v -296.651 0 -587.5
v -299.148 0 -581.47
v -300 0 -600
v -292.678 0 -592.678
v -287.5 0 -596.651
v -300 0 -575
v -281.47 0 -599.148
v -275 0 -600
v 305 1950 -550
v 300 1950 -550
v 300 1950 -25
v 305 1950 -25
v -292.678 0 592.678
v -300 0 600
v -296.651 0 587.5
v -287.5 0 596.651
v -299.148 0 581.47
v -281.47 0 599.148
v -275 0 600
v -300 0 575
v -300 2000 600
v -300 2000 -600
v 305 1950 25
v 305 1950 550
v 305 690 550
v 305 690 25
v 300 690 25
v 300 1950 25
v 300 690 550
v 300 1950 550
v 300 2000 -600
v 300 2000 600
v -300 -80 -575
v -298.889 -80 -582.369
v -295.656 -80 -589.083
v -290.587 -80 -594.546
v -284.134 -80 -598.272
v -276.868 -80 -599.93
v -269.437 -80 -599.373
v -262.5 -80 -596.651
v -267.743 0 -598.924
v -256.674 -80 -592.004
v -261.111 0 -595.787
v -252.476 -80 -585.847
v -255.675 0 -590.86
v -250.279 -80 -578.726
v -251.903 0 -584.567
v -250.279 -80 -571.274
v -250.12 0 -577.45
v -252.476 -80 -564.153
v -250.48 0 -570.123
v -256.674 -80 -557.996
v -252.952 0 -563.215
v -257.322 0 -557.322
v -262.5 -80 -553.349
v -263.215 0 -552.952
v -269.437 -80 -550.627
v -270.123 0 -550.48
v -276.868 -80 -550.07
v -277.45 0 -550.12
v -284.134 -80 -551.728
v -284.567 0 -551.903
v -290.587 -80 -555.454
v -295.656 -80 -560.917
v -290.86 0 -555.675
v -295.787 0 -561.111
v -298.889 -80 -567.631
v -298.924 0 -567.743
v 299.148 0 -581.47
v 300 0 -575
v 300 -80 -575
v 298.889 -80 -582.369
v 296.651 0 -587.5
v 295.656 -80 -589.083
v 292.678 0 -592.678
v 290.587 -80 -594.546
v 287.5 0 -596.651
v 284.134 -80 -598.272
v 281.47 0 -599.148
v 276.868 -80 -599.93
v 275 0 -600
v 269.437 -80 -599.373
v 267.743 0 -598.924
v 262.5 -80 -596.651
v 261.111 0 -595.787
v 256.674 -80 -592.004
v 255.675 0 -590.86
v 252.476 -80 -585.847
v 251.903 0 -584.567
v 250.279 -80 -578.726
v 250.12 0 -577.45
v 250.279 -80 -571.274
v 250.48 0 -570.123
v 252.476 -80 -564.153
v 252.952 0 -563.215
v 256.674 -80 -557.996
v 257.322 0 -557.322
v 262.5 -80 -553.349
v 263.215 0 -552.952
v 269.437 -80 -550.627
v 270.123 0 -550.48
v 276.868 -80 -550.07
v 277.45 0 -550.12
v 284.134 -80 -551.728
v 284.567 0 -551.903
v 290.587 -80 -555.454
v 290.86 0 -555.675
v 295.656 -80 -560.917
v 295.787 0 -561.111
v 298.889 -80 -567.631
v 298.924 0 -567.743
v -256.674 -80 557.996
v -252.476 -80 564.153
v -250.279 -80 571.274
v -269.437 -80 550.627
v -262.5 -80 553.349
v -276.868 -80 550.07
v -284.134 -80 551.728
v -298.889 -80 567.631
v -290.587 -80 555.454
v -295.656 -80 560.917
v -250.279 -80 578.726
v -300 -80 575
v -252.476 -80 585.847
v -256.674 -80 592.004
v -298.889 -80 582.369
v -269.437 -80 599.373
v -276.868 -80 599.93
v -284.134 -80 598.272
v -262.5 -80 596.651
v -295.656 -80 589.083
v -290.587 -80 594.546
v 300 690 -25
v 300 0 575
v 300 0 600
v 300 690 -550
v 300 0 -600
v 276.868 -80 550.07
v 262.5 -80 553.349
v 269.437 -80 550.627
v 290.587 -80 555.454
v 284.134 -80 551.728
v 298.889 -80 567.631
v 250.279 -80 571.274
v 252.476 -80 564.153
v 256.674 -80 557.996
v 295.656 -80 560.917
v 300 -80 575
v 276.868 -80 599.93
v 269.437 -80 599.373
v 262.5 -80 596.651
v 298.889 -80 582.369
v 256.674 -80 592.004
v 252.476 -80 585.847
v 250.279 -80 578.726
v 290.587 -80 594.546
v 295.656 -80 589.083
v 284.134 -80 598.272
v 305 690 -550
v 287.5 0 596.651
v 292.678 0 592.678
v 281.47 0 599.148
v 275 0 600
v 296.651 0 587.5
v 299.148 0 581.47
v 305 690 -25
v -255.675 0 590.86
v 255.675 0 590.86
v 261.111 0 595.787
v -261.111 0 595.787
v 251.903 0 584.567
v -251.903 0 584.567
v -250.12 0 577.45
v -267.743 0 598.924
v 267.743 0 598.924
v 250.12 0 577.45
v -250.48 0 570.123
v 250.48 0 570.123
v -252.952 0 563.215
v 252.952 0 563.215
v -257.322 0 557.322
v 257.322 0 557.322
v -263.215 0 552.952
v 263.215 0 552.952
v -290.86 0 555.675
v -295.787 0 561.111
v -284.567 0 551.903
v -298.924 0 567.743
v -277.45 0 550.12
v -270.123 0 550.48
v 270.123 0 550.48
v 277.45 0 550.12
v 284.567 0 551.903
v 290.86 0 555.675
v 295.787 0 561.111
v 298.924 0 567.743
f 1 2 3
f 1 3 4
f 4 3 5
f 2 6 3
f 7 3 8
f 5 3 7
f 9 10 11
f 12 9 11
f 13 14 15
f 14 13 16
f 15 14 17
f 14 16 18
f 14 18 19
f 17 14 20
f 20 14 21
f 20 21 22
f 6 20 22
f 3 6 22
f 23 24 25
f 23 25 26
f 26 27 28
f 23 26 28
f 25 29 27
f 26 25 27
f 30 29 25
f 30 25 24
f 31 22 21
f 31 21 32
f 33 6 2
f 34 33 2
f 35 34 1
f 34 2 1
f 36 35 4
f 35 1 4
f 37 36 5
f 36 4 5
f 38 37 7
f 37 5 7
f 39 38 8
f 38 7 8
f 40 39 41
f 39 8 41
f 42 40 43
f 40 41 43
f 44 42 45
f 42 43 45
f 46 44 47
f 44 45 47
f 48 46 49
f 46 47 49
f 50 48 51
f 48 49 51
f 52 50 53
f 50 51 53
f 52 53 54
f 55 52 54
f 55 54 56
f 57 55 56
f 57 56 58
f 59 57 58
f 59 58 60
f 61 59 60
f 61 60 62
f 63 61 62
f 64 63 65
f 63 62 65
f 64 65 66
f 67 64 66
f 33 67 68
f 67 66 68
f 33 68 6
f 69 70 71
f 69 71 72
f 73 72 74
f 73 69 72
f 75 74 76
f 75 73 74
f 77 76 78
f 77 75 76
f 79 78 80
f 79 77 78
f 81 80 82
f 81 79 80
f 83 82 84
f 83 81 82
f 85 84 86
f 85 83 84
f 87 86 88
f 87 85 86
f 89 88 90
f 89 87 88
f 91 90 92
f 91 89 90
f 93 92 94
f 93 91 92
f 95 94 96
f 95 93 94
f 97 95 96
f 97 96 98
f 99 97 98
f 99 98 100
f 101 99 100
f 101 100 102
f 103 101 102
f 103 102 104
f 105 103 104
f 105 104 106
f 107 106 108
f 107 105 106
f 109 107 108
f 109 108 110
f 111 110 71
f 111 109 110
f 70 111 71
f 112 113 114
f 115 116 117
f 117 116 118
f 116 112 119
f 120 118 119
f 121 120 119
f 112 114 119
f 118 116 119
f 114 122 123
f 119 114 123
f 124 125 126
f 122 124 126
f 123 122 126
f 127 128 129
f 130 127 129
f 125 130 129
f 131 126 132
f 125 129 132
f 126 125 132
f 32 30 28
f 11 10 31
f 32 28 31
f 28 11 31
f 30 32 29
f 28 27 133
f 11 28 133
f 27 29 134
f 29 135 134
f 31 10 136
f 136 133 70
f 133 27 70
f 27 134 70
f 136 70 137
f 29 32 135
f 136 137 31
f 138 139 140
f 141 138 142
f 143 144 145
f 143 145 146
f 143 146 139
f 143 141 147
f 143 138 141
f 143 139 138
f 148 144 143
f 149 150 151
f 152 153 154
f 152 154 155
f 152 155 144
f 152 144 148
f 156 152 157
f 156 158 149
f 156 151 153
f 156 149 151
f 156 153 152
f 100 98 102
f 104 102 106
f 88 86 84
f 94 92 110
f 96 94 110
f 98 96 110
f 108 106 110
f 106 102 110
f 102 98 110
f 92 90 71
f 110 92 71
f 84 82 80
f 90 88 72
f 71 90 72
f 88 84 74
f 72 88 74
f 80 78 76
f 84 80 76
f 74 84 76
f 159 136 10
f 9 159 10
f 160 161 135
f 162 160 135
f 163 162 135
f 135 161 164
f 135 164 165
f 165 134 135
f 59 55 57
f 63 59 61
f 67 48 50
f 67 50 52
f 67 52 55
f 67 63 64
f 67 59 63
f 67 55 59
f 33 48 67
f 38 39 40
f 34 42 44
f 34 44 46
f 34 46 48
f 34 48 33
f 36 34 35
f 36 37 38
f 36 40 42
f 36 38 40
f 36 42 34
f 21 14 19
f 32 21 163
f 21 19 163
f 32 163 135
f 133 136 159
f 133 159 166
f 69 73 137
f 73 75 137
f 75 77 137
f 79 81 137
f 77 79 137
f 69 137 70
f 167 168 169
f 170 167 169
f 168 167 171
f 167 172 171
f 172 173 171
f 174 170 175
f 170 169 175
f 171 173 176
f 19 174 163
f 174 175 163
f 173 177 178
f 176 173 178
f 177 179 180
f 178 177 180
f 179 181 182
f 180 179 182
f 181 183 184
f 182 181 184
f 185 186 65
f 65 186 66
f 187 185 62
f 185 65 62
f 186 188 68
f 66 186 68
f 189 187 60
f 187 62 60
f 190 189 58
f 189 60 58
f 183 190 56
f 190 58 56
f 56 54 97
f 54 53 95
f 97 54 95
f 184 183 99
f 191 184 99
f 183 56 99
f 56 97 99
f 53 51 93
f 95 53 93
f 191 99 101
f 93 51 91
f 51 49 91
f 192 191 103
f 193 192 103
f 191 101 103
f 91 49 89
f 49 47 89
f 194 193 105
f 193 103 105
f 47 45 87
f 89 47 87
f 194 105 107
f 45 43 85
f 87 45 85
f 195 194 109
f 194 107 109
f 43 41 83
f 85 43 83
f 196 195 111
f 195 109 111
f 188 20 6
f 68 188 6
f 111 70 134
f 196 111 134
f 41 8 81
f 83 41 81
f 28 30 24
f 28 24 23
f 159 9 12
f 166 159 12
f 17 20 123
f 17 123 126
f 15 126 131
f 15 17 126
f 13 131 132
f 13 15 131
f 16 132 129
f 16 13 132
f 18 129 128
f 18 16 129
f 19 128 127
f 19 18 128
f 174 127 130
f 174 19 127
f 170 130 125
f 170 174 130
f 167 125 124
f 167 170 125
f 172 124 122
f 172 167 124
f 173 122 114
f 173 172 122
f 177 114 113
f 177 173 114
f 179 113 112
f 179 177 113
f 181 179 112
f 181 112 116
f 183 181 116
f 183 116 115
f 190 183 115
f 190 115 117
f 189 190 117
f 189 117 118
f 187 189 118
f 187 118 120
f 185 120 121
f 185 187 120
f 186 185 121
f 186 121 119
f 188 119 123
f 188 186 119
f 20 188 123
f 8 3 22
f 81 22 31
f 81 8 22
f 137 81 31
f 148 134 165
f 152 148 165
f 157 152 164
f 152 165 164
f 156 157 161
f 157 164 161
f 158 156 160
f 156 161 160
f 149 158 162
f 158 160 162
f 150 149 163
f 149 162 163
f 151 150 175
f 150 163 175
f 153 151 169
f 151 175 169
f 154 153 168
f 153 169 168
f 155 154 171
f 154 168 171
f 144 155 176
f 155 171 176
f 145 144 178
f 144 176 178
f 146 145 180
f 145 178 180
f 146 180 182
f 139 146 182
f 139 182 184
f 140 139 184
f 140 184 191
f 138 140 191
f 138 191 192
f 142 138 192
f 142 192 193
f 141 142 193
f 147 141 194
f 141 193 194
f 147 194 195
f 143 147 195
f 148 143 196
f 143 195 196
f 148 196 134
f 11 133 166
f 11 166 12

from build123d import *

# Parameters (mm, degrees)
SKETCH_1_W               = 600
SKETCH_1_H               = 1200
EXTRUDE_1_DEPTH          = 2000
SKETCH_2_R               = 25
EXTRUDE_2_DEPTH          = 80
MIRROR_2_COPY_1_SKETCH_R = 25
MIRROR_2_COPY_1_DEPTH    = 80
SKETCH_3_W               = 525
SKETCH_3_H               = 1260
EXTRUDE_3_DEPTH          = 5


with BuildPart() as part:
    # 草图1 → 凸台-拉伸1 (new body)
    with BuildSketch(Plane(origin=(0, 0, 0), x_dir=(1, 0, 0), z_dir=(0, 1, 0))):
        Rectangle(SKETCH_1_W, SKETCH_1_H)
    extrude(amount=EXTRUDE_1_DEPTH)

    # 草图2 → 凸台-拉伸2 (add)
    with BuildSketch(Plane.XZ):
        with Locations((275, 575)):
            Circle(SKETCH_2_R)
    extrude_2 = extrude(amount=EXTRUDE_2_DEPTH)

    # 镜向1: 凸台-拉伸2 across plane
    add(extrude_2.mirror(Plane(origin=(0, 0, 0), x_dir=(0, 0, 1), z_dir=(1, 0, 0))))

    # 镜向2: 凸台-拉伸2 across plane
    add(extrude_2.mirror(Plane.XY))

    # 镜向2 copy 1 sketch → 镜向2 copy 1 (add)
    with BuildSketch(Plane(origin=(0, 0, 0), x_dir=(-1, 0, 0), z_dir=(0, -1, 0))):
        with Locations((275, 575)):
            Circle(MIRROR_2_COPY_1_SKETCH_R)
    extrude(amount=MIRROR_2_COPY_1_DEPTH)

    # 草图3 → 凸台-拉伸3 (add)
    with BuildSketch(Plane(origin=(300, 0, 0), x_dir=(0, 0, -1), z_dir=(1, 0, 0))):
        with Locations((-287.5, 1320)):
            Rectangle(SKETCH_3_W, SKETCH_3_H)
    extrude_3 = extrude(amount=EXTRUDE_3_DEPTH)

    # 镜向3: 凸台-拉伸3 across plane
    add(extrude_3.mirror(Plane.XY))


solid = part.part
